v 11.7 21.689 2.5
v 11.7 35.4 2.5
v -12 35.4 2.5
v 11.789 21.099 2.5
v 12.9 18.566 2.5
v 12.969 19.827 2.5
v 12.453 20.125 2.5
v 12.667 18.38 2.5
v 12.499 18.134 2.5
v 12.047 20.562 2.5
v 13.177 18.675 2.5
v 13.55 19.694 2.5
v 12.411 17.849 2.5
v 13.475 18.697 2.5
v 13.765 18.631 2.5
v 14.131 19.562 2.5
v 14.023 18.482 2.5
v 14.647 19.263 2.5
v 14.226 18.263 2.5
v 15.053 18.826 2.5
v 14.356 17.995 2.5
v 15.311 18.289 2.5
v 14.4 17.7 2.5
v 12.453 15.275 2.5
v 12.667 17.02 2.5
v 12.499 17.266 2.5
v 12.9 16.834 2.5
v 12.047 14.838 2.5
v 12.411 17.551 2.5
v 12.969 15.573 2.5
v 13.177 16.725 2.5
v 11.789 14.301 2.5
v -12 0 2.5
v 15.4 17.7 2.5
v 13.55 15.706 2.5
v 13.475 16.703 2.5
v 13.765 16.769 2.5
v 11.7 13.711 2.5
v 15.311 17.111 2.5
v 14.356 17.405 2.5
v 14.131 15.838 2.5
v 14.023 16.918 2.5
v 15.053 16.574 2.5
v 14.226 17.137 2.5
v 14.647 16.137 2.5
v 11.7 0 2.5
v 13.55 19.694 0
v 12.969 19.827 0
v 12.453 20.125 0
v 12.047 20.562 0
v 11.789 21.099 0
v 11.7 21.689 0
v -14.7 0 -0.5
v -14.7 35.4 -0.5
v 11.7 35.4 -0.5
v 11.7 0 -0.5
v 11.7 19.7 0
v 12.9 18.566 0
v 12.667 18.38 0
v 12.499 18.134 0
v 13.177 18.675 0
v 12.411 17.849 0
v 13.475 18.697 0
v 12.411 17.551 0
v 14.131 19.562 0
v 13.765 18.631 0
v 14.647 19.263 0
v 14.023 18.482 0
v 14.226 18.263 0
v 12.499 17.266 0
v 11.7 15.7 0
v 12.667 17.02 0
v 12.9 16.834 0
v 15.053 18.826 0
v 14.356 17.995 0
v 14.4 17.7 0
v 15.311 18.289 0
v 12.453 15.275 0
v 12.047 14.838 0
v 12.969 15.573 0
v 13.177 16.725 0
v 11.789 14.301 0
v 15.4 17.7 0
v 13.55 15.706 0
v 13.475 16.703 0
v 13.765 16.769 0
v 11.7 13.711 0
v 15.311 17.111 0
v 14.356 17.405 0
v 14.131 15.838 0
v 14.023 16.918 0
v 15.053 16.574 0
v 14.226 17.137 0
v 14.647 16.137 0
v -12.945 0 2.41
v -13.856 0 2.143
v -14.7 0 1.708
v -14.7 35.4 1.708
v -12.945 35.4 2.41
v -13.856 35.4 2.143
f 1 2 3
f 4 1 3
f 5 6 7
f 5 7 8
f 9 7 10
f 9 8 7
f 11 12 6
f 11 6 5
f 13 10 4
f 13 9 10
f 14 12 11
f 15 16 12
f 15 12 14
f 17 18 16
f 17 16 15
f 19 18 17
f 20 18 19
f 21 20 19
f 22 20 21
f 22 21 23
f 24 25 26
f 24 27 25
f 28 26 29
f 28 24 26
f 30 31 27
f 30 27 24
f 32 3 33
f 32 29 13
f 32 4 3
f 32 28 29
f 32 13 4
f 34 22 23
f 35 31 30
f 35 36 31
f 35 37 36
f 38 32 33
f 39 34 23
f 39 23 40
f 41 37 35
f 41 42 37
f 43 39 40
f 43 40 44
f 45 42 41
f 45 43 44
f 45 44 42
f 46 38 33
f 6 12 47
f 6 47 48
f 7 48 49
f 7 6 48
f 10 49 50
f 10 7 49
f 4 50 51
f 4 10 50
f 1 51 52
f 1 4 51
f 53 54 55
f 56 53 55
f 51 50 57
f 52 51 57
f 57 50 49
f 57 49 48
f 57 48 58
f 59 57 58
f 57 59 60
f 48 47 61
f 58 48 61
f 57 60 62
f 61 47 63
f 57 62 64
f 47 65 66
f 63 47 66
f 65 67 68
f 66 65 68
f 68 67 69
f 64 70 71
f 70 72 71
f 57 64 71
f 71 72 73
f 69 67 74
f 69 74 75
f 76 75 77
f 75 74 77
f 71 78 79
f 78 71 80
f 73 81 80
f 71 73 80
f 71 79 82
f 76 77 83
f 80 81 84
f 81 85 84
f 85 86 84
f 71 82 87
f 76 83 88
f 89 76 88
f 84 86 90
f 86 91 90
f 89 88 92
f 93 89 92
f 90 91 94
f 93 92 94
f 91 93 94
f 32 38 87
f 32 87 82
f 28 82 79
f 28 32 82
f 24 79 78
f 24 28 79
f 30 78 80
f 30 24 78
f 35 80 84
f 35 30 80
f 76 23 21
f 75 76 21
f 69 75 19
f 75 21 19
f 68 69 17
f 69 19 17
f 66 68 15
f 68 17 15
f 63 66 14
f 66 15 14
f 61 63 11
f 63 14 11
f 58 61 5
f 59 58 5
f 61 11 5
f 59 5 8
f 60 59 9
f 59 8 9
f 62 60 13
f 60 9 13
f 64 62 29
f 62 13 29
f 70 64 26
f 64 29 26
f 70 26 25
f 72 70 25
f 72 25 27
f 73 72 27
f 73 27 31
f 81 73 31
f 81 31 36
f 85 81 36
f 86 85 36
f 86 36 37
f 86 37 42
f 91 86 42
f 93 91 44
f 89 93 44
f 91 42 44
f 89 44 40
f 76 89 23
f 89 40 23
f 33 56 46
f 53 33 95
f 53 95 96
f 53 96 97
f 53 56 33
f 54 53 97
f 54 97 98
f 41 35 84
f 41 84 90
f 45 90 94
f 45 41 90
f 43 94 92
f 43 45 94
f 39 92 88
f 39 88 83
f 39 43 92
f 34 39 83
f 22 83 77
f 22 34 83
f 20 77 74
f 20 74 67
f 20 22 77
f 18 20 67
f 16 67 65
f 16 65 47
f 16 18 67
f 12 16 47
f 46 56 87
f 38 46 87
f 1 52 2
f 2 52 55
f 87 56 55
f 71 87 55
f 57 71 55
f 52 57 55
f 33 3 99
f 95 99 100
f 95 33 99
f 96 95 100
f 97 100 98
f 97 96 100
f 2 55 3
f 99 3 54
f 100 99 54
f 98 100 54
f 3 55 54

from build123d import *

# Parameters (mm, degrees)
BOSS_EXTRUDE1_DEPTH = 35.4
SKETCH2_W           = 28.62824493
SKETCH2_H           = 44.507069041
CUT_EXTRUDE1_DEPTH  = 36
SKETCH3_W           = 27
SKETCH3_H           = 2
CUT_EXTRUDE2_DEPTH  = 39.528041736
SKETCH4_W           = 4.666859097
SKETCH4_H           = 39.875061907
SKETCH4_W_2         = 6.439084071
SKETCH4_H_2         = 41.174693554
CUT_EXTRUDE3_DEPTH  = 39.563713514
SKETCH5_R           = 1
BOSS_EXTRUDE2_DEPTH = 2.5
FILLET1_R           = 2


with BuildPart() as part:
    # Sketch1 → Boss-Extrude1 (new body)
    with BuildSketch(Plane(origin=(0, 0, 0), x_dir=(1, 0, 0), z_dir=(0, 1, 0))):
        with BuildLine():
            Line((-17, 2.5), (-12, 2.5))
            Line((-12, 2.5), (12, 2.5))
            Line((12, 2.5), (12, -2.5))
            Line((12, -2.5), (-12, -2.5))
            ThreePointArc((-12, -2.5), (-15.535533906, -1.035533906), (-17, 2.5))
        make_face()
    extrude(amount=BOSS_EXTRUDE1_DEPTH)

    # Sketch2 → Cut-Extrude1 (cut)
    with BuildSketch(Plane(origin=(0, 0, -2.5), x_dir=(-1, 0, 0), z_dir=(0, 0, -1))):
        with Locations((29.314122465, 17.150131431)):
            Rectangle(SKETCH2_W, SKETCH2_H)
    extrude(amount=-CUT_EXTRUDE1_DEPTH, mode=Mode.SUBTRACT)

    # Sketch3 → Cut-Extrude2 (cut, through all)
    with BuildSketch(Plane(origin=(0, 35.4, 0), x_dir=(1, 0, 0), z_dir=(0, 1, 0))):
        with Locations((-1.5, 1.5)):
            Rectangle(SKETCH3_W, SKETCH3_H)
    extrude(amount=-CUT_EXTRUDE2_DEPTH, mode=Mode.SUBTRACT)

    # Sketch4 → Cut-Extrude3 (cut, through all)
    with BuildSketch(Plane(origin=(0, 0, -0.5), x_dir=(-1, 0, 0), z_dir=(0, 0, -1))):
        with Locations((-14.033429549, 18.67919463)):
            Rectangle(SKETCH4_W, SKETCH4_H)
        with Locations((17.919542036, 18.501972132)):
            Rectangle(SKETCH4_W_2, SKETCH4_H_2)
    extrude(amount=-CUT_EXTRUDE3_DEPTH, mode=Mode.SUBTRACT)

    # Sketch5 → Boss-Extrude2 (add)
    with BuildSketch(Plane.XY.offset(2.5)):
        with BuildLine():
            Line((13.4, 19.7), (11.7, 19.7))
            Line((11.7, 19.7), (11.7, 15.7))
            Line((11.7, 15.7), (13.4, 15.7))
            ThreePointArc((13.4, 15.7), (15.4, 17.7), (13.4, 19.7))
        make_face()
        with Locations((13.4, 17.7)):
            Circle(SKETCH5_R, mode=Mode.SUBTRACT)
    extrude(amount=-BOSS_EXTRUDE2_DEPTH)

    # Fillet1
    # the kernel refuses this fillet: 2 mm, written as the material it adds along each edge
    with BuildSketch(Plane(origin=(11.7, 15.7, 2.5), x_dir=(0, -1, 0), z_dir=(0, 0, -1))) as fillet1_piece_1:
        with BuildLine():
            CenterArc((1.988734135, -2), FILLET1_R, 90, 85.698777695)
            Line((-0.005632932, -1.85), (-0.205069639, -1.835))
            ThreePointArc((-0.205069639, -1.835), (-0.2, -1.7), (-0.2, 0))
            Line((-0.2, 0), (0, 0.2))
            Line((0, 0.2), (1.988734135, 0.2))
            Line((1.988734135, 0.2), (1.988734135, 0))
        make_face()
    extrude(amount=2.5)
    with BuildSketch(Plane(origin=(11.7, 19.7, 2.5), x_dir=(0, 1, 0), z_dir=(0, 0, -1))) as fillet1_piece_2:
        with BuildLine():
            CenterArc((1.988734135, 2), FILLET1_R, 184.301222305, 85.698777695)
            Line((-0.005632932, 1.85), (-0.205069639, 1.835))
            ThreePointArc((-0.205069639, 1.835), (-0.2, 1.7), (-0.2, 0))
            Line((-0.2, 0), (0, -0.2))
            Line((0, -0.2), (1.988734135, -0.2))
            Line((1.988734135, -0.2), (1.988734135, 0))
        make_face()
    extrude(amount=2.5)


solid = part.part
